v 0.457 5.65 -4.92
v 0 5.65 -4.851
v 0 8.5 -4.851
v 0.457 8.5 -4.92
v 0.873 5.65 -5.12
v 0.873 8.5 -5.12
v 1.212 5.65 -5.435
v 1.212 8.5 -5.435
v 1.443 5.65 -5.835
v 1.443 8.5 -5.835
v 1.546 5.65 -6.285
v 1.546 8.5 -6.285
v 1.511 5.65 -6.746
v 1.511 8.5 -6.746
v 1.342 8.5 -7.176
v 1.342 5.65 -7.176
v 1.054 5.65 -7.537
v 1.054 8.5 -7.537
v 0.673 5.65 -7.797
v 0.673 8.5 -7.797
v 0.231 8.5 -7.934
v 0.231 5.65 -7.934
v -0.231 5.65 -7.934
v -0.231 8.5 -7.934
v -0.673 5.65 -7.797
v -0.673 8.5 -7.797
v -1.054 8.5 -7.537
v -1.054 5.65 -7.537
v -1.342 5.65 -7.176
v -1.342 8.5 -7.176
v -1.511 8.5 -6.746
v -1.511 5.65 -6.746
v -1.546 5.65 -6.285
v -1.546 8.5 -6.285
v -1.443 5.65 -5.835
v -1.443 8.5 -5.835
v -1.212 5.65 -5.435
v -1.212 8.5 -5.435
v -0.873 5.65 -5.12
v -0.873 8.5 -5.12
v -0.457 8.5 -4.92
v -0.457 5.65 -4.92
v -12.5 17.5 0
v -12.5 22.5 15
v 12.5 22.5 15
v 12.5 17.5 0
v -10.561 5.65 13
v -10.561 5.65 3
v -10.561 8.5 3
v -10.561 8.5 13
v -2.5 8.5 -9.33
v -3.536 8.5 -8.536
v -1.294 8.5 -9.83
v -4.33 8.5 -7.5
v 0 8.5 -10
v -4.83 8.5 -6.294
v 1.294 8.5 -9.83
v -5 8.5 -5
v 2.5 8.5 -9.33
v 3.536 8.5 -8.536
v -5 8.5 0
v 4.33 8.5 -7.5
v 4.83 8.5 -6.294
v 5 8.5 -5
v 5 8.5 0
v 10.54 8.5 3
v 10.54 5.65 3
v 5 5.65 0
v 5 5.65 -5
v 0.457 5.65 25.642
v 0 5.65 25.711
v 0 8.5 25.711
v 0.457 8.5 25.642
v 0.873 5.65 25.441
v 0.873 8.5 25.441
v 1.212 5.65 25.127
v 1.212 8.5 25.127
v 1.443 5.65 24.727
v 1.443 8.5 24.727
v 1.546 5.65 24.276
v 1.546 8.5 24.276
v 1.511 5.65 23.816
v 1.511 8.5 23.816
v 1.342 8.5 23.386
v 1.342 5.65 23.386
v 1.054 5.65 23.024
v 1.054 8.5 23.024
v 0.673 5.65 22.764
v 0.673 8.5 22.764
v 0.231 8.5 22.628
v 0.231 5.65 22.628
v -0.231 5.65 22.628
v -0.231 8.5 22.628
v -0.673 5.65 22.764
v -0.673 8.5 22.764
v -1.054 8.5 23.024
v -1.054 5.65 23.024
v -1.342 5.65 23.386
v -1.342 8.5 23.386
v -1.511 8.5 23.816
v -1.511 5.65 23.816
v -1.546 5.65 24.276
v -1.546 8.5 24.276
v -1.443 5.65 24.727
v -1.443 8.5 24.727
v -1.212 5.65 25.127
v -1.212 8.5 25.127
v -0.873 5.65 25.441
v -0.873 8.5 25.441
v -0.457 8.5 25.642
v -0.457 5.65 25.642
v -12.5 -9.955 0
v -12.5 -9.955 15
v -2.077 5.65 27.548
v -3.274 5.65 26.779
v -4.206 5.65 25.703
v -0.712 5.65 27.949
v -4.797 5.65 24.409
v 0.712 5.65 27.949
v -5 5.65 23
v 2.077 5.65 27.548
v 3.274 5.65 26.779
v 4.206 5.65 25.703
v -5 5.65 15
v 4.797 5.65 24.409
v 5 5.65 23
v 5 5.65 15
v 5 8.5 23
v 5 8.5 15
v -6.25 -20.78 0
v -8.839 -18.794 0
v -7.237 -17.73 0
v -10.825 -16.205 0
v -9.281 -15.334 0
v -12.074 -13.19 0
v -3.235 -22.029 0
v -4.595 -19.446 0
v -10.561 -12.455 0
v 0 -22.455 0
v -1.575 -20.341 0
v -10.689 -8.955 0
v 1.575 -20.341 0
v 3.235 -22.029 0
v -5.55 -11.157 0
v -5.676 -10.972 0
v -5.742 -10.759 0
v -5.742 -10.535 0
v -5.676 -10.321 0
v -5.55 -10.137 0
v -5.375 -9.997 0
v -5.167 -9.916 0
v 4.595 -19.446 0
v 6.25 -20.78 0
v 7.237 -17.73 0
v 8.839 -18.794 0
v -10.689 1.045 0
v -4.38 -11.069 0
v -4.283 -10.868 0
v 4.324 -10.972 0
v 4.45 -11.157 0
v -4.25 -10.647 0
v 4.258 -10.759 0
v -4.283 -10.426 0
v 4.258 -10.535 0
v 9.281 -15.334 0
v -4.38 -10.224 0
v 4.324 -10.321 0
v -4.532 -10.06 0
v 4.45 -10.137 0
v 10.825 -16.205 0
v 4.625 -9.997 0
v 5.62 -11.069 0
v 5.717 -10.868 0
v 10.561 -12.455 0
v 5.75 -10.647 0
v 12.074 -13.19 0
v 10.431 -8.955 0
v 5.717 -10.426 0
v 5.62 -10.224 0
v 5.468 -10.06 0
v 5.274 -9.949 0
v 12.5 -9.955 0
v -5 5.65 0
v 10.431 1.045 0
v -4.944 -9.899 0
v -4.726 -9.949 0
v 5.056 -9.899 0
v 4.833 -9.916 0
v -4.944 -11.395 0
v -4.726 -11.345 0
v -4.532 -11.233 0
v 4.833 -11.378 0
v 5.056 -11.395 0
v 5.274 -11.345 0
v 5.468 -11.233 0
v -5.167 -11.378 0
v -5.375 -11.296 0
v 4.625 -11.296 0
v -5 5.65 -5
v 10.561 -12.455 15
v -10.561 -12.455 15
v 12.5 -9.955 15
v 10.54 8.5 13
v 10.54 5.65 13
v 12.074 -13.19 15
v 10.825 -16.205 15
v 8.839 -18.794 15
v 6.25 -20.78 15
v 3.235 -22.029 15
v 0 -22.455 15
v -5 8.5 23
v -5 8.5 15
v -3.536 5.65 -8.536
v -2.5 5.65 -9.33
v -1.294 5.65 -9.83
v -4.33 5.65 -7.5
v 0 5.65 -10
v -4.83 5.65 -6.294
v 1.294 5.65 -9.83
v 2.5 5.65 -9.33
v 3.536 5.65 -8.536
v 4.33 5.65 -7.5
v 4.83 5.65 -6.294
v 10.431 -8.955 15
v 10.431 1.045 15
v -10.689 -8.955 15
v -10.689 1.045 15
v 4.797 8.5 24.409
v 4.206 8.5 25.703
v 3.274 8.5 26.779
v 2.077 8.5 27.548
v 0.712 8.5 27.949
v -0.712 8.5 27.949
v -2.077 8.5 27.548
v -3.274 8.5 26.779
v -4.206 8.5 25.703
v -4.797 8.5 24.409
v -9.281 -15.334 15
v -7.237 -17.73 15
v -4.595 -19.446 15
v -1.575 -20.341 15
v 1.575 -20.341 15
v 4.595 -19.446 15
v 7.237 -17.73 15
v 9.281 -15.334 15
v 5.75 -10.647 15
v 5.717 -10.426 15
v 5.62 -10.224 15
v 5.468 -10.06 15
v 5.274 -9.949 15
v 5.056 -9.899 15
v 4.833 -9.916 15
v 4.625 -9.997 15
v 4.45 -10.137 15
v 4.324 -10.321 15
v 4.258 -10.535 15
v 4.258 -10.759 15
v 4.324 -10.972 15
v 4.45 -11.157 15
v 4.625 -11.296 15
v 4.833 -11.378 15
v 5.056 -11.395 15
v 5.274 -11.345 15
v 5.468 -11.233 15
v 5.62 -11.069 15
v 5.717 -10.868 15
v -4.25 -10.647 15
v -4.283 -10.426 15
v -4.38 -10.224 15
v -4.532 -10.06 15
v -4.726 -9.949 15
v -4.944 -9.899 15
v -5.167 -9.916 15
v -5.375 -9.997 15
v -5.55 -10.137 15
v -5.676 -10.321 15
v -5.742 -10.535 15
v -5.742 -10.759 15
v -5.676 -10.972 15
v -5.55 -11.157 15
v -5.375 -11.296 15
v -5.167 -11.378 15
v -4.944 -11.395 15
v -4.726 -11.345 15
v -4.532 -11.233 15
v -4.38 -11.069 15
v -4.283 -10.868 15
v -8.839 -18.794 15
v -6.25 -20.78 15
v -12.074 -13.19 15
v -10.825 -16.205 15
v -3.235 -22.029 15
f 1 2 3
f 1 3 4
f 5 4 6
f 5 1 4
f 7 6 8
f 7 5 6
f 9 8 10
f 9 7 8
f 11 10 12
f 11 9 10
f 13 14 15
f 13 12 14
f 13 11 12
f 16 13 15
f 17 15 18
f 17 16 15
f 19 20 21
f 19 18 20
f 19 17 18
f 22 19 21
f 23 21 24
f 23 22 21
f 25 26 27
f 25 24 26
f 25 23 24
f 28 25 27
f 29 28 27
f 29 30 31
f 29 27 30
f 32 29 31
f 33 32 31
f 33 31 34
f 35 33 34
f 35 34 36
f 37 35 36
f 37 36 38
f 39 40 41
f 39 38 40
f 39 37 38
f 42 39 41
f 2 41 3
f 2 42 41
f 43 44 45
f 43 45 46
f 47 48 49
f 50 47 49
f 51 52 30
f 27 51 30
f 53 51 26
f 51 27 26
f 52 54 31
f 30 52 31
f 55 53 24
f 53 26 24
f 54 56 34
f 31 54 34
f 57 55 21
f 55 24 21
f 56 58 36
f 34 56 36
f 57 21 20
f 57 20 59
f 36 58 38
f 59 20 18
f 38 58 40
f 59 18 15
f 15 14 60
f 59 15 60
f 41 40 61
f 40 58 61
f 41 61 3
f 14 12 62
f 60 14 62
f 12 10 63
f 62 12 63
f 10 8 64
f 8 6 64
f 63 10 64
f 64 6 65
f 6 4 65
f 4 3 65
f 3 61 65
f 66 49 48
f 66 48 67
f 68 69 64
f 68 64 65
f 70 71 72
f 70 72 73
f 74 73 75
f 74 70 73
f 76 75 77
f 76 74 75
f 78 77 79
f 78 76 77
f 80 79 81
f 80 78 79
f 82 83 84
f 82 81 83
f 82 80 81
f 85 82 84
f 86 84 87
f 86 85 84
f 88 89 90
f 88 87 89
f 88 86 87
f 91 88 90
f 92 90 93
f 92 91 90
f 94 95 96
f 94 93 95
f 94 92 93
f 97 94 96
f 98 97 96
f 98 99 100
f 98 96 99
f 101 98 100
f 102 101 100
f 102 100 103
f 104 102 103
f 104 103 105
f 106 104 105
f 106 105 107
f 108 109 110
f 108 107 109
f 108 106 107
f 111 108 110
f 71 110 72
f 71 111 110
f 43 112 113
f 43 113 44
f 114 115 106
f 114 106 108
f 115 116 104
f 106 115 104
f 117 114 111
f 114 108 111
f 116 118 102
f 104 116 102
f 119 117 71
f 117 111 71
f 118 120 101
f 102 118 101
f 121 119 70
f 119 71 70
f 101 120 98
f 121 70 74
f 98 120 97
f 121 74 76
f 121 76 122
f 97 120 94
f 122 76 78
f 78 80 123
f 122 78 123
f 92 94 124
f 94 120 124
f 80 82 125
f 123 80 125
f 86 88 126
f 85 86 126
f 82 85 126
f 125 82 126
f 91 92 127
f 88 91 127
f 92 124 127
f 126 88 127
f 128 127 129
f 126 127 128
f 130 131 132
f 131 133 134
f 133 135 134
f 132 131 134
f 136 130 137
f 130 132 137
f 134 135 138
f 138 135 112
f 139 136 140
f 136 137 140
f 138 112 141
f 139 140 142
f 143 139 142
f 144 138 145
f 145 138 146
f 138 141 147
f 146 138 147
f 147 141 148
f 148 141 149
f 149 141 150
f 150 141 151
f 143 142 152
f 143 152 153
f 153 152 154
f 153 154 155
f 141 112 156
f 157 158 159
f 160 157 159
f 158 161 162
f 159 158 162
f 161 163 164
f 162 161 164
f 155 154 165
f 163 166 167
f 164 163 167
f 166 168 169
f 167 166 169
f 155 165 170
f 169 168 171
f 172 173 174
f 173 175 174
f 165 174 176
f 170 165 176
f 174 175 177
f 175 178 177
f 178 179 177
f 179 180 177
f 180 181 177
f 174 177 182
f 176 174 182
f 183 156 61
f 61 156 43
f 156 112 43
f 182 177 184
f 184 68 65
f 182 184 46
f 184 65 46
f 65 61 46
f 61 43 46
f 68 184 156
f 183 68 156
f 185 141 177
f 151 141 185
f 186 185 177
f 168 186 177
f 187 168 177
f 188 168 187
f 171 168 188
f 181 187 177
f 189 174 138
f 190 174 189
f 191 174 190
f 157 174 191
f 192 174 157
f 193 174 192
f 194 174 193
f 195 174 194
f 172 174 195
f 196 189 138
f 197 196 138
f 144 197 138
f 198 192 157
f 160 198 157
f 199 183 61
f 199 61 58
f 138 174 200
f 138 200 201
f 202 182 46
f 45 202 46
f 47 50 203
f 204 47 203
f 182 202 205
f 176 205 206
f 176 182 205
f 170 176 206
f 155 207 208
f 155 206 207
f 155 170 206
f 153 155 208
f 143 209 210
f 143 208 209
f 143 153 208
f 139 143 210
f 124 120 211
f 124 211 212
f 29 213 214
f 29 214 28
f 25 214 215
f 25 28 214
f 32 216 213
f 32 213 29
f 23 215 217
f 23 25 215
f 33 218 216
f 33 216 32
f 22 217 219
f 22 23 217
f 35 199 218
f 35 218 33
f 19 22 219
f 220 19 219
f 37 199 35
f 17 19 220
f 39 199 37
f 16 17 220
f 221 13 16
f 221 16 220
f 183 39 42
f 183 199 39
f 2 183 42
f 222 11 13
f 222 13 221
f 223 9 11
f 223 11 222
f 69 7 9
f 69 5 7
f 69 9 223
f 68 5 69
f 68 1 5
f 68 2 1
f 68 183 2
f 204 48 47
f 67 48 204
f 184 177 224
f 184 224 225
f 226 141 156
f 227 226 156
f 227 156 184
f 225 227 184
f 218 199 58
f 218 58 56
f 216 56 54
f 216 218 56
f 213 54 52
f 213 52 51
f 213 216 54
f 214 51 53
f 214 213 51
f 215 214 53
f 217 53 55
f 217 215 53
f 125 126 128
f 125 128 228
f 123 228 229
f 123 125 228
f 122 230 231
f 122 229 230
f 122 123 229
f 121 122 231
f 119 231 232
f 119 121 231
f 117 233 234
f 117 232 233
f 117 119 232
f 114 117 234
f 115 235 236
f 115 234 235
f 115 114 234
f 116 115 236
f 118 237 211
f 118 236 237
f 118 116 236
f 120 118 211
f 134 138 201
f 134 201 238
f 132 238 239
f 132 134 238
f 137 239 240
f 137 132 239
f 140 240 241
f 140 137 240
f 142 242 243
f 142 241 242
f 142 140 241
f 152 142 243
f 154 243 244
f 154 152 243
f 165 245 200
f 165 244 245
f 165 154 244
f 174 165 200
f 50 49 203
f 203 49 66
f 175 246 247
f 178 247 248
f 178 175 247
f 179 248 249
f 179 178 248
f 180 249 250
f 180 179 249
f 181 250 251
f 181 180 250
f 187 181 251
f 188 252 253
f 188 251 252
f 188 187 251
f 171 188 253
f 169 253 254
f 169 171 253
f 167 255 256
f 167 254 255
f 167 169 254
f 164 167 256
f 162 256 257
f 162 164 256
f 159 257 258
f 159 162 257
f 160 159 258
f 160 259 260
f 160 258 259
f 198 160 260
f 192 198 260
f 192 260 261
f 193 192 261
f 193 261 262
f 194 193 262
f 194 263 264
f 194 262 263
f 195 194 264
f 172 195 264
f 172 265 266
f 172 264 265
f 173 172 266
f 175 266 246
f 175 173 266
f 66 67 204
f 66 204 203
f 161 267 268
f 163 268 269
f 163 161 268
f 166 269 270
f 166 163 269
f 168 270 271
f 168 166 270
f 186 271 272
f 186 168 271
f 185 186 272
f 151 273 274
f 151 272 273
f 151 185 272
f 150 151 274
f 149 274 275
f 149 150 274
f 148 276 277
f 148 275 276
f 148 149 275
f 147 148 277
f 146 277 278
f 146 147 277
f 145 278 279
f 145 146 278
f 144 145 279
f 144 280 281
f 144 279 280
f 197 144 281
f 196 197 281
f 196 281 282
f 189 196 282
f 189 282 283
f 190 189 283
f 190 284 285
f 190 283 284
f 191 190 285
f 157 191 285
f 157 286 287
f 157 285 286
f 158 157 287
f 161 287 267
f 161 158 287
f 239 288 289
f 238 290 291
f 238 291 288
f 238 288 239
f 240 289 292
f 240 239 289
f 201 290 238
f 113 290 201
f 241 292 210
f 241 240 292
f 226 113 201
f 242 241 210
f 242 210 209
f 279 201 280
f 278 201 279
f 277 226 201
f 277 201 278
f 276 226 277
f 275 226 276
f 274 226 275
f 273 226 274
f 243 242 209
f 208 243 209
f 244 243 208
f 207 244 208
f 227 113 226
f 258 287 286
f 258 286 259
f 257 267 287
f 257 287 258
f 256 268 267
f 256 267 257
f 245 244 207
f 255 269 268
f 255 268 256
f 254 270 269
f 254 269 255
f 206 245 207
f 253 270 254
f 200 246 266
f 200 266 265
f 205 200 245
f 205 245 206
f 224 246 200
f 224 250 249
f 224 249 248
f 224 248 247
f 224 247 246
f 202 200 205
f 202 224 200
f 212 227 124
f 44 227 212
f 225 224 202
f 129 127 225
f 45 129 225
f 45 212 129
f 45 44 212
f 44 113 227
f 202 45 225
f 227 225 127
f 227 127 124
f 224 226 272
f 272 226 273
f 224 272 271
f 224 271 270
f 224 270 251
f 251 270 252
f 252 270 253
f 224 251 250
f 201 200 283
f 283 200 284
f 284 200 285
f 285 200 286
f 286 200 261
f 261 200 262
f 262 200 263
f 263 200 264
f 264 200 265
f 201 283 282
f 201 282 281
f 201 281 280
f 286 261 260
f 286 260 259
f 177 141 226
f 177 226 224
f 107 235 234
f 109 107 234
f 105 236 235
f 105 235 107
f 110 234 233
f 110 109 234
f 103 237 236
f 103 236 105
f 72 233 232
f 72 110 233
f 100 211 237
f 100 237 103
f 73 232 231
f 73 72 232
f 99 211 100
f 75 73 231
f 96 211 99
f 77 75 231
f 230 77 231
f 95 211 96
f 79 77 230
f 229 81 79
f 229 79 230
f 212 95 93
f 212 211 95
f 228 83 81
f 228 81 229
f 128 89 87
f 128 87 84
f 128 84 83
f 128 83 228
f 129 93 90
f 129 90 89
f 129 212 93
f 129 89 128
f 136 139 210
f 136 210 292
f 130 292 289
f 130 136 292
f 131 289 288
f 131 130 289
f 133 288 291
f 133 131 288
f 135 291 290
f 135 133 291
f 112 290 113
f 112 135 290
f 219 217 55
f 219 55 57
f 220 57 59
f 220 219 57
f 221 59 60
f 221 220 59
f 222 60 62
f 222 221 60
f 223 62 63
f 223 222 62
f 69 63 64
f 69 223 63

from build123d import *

# Parameters (mm, degrees)
SKETCH1_W                = 25
SKETCH1_H                = 45
BOSS_EXTRUDE1_DEPTH      = 15
BOSS_EXTRUDE2_START      = -10.05
BOSS_EXTRUDE2_DEPTH      = 20.1
CUT_EXTRUDE1_DEPTH       = 30.79093822
CUT_EXTRUDE1_DEPTH_BACK  = 30.79093822
CUT_EXTRUDE3_DEPTH       = 30.79093822
CUT_EXTRUDE3_DEPTH_BACK  = 30.79093822
CUT_EXTRUDE7_DEPTH       = 30.79093822
CUT_EXTRUDE9_OUTLINE_W   = 21.12
CUT_EXTRUDE9_OUTLINE_H   = 10
CUT_EXTRUDE9_OUTLINE_W_2 = 21.100995898
CUT_EXTRUDE9_OUTLINE_H_2 = 2.85
CUT_EXTRUDE9_DEPTH       = 15
SKETCH8_W                = 7
SKETCH8_H                = 2.5
BOSS_EXTRUDE3_DEPTH      = 10
CUT_EXTRUDE11_DEPTH      = 30.79093822
CUT_EXTRUDE11_DEPTH_BACK = 30.79093822
CUT_EXTRUDE12_DEPTH      = 30.79093822
CUT_EXTRUDE12_DEPTH_BACK = 30.79093822
SKETCH10_R               = 1.6
CUT_EXTRUDE14_DEPTH      = 30.79093822
CUT_EXTRUDE14_DEPTH_BACK = 30.79093822
SKETCH12_R               = 0.75
CUT_EXTRUDE15_DEPTH      = 30.79093822
CUT_EXTRUDE15_DEPTH_BACK = 30.79093822
SKETCH15_W               = 15.416816506
SKETCH15_H               = 10.763431908
BOSS_EXTRUDE5_START      = 3
SKETCH16_W               = 21.100995898
SKETCH16_H               = 2.85
BOSS_EXTRUDE5_DEPTH      = 13
CUT_EXTRUDE17_DEPTH      = 30.79093822
CUT_EXTRUDE17_DEPTH_BACK = 30.79093822
SKETCH17_R               = 1.55
BOSS_EXTRUDE6_START      = 13
SKETCH18_W               = 21.100995898
SKETCH18_H               = 2.85
BOSS_EXTRUDE6_DEPTH      = 15
CUT_EXTRUDE18_DEPTH      = 39.032880511
CUT_EXTRUDE18_DEPTH_BACK = 39.032880511
SKETCH19_R               = 1.55


# Read off the part's stored shape, not the designer's step: Cut-Extrude9
with BuildPart() as part:
    # Sketch1 → Boss-Extrude1 (new body)
    with BuildSketch(Plane.XY):
        Rectangle(SKETCH1_W, SKETCH1_H)
    extrude(amount=BOSS_EXTRUDE1_DEPTH)

    # Sketch2 → Boss-Extrude2 (add)
    with BuildSketch(Plane(origin=(0, 0, 0), x_dir=(0, 0, -1), z_dir=(1, 0, 0)).offset(BOSS_EXTRUDE2_START)):
        Polygon((-15, 22.5), (-15, 21.775067879), (0, 22.5), align=None)
    extrude(amount=BOSS_EXTRUDE2_DEPTH)

    # Sketch3 → Cut-Extrude1 (cut, two sides: drawn at the far end of the back side and taken through both)
    with BuildSketch(Plane(origin=(0, 0, 0), x_dir=(0, 0, -1), z_dir=(1, 0, 0)).offset(-CUT_EXTRUDE1_DEPTH_BACK)):
        Polygon((-15, 22.5), (0, 17.5), (5.857225601, 19.69853849), (5.857225601, 28.456051758), (-15, 27.780768739), align=None)
    extrude(amount=CUT_EXTRUDE1_DEPTH + CUT_EXTRUDE1_DEPTH_BACK, mode=Mode.SUBTRACT)

    # Sketch4 → Cut-Extrude3 (cut, two sides: drawn at the far end of the back side and taken through both)
    with BuildSketch(Plane.XY.offset(-CUT_EXTRUDE3_DEPTH_BACK)):
        with BuildLine():
            Line((-17.124140969, -24.670147455), (0, -24.921234566))
            Line((0, -24.921234566), (0, -22.455047029))
            ThreePointArc((0, -22.455047029), (-8.838834765, -18.793881794), (-12.5, -9.955047029))
            Line((-12.5, -9.955047029), (-17.124140969, -24.670147455))
        make_face()
        with BuildLine():
            Line((0, -22.455047029), (0, -24.921234566))
            Line((0, -24.921234566), (18.053725517, -25.185951949))
            Line((18.053725517, -25.185951949), (12.5, -9.955047029))
            ThreePointArc((12.5, -9.955047029), (8.838834765, -18.793881794), (0, -22.455047029))
        make_face()
    extrude(amount=CUT_EXTRUDE3_DEPTH + CUT_EXTRUDE3_DEPTH_BACK, mode=Mode.SUBTRACT)

    # Sketch5 → Cut-Extrude7 (cut, through all)
    with BuildSketch(Plane.XY):
        with BuildLine():
            Line((10.560989946, -12.455047029), (-10.560989946, -12.455047029))
            ThreePointArc((-10.560989946, -12.455047029), (0, -20.455047029), (10.560989946, -12.455047029))
        make_face()
    extrude(amount=CUT_EXTRUDE7_DEPTH, mode=Mode.SUBTRACT)

    # Cut-Extrude9 outline → Cut-Extrude9 (cut)
    with BuildSketch(Plane.XY):
        with Locations((-0.129474346, -3.955047029)):
            Rectangle(CUT_EXTRUDE9_OUTLINE_W, CUT_EXTRUDE9_OUTLINE_H)
        with Locations((-0.010491997, 7.075)):
            Rectangle(CUT_EXTRUDE9_OUTLINE_W_2, CUT_EXTRUDE9_OUTLINE_H_2)
    extrude(amount=CUT_EXTRUDE9_DEPTH, mode=Mode.SUBTRACT)

    # Sketch8 → Boss-Extrude3 (add)
    with BuildSketch(Plane.XY):
        with Locations((0, 4.4)):
            Rectangle(SKETCH8_W, SKETCH8_H)
    extrude(amount=-BOSS_EXTRUDE3_DEPTH)

    # Sketch9 → Cut-Extrude11 (cut, two sides: drawn at the far end of the back side and taken through both)
    with BuildSketch(Plane(origin=(0, 0, 0), x_dir=(1, 0, 0), z_dir=(0, 1, 0)).offset(-CUT_EXTRUDE11_DEPTH_BACK)):
        with BuildLine():
            Line((-5.143587348, 10.809031185), (-3.492186712, 6.389631225))
            ThreePointArc((-3.492186712, 6.389631225), (0, 9.881817937), (3.492186712, 6.389631225))
            ThreePointArc((3.492186712, 6.389631225), (3.488488867, 6.228965567), (3.477403165, 6.068640163))
            Line((3.477403165, 6.068640163), (6.889064643, 10.549066481))
            Line((6.889064643, 10.549066481), (-5.143587348, 10.809031185))
        make_face()
    extrude(amount=CUT_EXTRUDE11_DEPTH + CUT_EXTRUDE11_DEPTH_BACK, mode=Mode.SUBTRACT)

    # Sketch10 → Cut-Extrude12 (cut, two sides: drawn at the far end of the back side and taken through both)
    with BuildSketch(Plane(origin=(0, 0, 0), x_dir=(1, 0, 0), z_dir=(0, 1, 0)).offset(-CUT_EXTRUDE12_DEPTH_BACK)):
        with Locations((0, 6.891628676)):
            Circle(SKETCH10_R)
        with BuildLine():
            ThreePointArc((1.6, 6.891628676), (0, 5.291628676), (-1.6, 6.891628676))
            Line((-1.6, 6.891628676), (-1.6, 0))
            Line((-1.6, 0), (1.6, 0))
            Line((1.6, 0), (1.6, 6.891628676))
        make_face()
    extrude(amount=CUT_EXTRUDE12_DEPTH + CUT_EXTRUDE12_DEPTH_BACK, mode=Mode.SUBTRACT)

    # Sketch12 → Cut-Extrude14 (cut, two sides: drawn at the far end of the back side and taken through both)
    with BuildSketch(Plane.XY.offset(-CUT_EXTRUDE14_DEPTH_BACK)):
        with Locations((-5, -10.646832198)):
            Circle(SKETCH12_R)
        with Locations((5, -10.646832198)):
            Circle(SKETCH12_R)
    extrude(amount=CUT_EXTRUDE14_DEPTH + CUT_EXTRUDE14_DEPTH_BACK, mode=Mode.SUBTRACT)

    # Sketch15 → Cut-Extrude15 (cut, two sides: drawn at the far end of the back side and taken through both)
    with BuildSketch(Plane(origin=(0, 0, 0), x_dir=(1, 0, 0), z_dir=(0, 1, 0)).offset(-CUT_EXTRUDE15_DEPTH_BACK)):
        with Locations((0.052797317, 5.381715954)):
            Rectangle(SKETCH15_W, SKETCH15_H)
    extrude(amount=CUT_EXTRUDE15_DEPTH + CUT_EXTRUDE15_DEPTH_BACK, mode=Mode.SUBTRACT)

    # Sketch16 → Boss-Extrude5 (add)
    with BuildSketch(Plane.XY.offset(BOSS_EXTRUDE5_START)):
        with Locations((-0.010491997, 7.075)):
            Rectangle(SKETCH16_W, SKETCH16_H)
    extrude(amount=-BOSS_EXTRUDE5_DEPTH)

    # Sketch17 → Cut-Extrude17 (cut, two sides: drawn at the far end of the back side and taken through both)
    with BuildSketch(Plane(origin=(0, 0, 0), x_dir=(1, 0, 0), z_dir=(0, 1, 0)).offset(-CUT_EXTRUDE17_DEPTH_BACK)):
        with Locations(Location((0, 6.400921521, 0), (0, 0, 270))):
            Circle(SKETCH17_R)
        with BuildLine():
            Line((5, 5), (5, 0))
            Line((5, 0), (12.5, 0))
            Line((12.5, 0), (12.436231279, 14.247241291))
            Line((12.436231279, 14.247241291), (-13.710360946, 14.247241291))
            Line((-13.710360946, 14.247241291), (-13.710360946, 0))
            Line((-13.710360946, 0), (-5, 0))
            Line((-5, 0), (-5, 5))
            ThreePointArc((-5, 5), (-3.535533906, 8.535533906), (0, 10))
            ThreePointArc((0, 10), (3.535533906, 8.535533906), (5, 5))
        make_face()
    extrude(amount=CUT_EXTRUDE17_DEPTH + CUT_EXTRUDE17_DEPTH_BACK, mode=Mode.SUBTRACT)

    # Sketch18 → Boss-Extrude6 (add)
    with BuildSketch(Plane.XY.offset(BOSS_EXTRUDE6_START)):
        with Locations((-0.010491997, 7.075)):
            Rectangle(SKETCH18_W, SKETCH18_H)
    extrude(amount=BOSS_EXTRUDE6_DEPTH)

    # Sketch19 → Cut-Extrude18 (cut, two sides: drawn at the far end of the back side and taken through both)
    with BuildSketch(Plane(origin=(0, 0, 0), x_dir=(1, 0, 0), z_dir=(0, 1, 0)).offset(-CUT_EXTRUDE18_DEPTH_BACK)):
        with Locations(Location((0, -24.160628435, 0), (0, 0, 270))):
            Circle(SKETCH19_R)
        with BuildLine():
            Line((-5, -23), (-5, -15))
            Line((-5, -15), (-19.938016683, -15))
            Line((-19.938016683, -15), (-19.938016683, -28.423127273))
            Line((-19.938016683, -28.423127273), (20.151320265, -28.423127273))
            Line((20.151320265, -28.423127273), (20.151320265, -15))
            Line((20.151320265, -15), (5, -15))
            Line((5, -15), (5, -23))
            ThreePointArc((5, -23), (0, -28), (-5, -23))
        make_face()
    extrude(amount=CUT_EXTRUDE18_DEPTH + CUT_EXTRUDE18_DEPTH_BACK, mode=Mode.SUBTRACT)


solid = part.part
